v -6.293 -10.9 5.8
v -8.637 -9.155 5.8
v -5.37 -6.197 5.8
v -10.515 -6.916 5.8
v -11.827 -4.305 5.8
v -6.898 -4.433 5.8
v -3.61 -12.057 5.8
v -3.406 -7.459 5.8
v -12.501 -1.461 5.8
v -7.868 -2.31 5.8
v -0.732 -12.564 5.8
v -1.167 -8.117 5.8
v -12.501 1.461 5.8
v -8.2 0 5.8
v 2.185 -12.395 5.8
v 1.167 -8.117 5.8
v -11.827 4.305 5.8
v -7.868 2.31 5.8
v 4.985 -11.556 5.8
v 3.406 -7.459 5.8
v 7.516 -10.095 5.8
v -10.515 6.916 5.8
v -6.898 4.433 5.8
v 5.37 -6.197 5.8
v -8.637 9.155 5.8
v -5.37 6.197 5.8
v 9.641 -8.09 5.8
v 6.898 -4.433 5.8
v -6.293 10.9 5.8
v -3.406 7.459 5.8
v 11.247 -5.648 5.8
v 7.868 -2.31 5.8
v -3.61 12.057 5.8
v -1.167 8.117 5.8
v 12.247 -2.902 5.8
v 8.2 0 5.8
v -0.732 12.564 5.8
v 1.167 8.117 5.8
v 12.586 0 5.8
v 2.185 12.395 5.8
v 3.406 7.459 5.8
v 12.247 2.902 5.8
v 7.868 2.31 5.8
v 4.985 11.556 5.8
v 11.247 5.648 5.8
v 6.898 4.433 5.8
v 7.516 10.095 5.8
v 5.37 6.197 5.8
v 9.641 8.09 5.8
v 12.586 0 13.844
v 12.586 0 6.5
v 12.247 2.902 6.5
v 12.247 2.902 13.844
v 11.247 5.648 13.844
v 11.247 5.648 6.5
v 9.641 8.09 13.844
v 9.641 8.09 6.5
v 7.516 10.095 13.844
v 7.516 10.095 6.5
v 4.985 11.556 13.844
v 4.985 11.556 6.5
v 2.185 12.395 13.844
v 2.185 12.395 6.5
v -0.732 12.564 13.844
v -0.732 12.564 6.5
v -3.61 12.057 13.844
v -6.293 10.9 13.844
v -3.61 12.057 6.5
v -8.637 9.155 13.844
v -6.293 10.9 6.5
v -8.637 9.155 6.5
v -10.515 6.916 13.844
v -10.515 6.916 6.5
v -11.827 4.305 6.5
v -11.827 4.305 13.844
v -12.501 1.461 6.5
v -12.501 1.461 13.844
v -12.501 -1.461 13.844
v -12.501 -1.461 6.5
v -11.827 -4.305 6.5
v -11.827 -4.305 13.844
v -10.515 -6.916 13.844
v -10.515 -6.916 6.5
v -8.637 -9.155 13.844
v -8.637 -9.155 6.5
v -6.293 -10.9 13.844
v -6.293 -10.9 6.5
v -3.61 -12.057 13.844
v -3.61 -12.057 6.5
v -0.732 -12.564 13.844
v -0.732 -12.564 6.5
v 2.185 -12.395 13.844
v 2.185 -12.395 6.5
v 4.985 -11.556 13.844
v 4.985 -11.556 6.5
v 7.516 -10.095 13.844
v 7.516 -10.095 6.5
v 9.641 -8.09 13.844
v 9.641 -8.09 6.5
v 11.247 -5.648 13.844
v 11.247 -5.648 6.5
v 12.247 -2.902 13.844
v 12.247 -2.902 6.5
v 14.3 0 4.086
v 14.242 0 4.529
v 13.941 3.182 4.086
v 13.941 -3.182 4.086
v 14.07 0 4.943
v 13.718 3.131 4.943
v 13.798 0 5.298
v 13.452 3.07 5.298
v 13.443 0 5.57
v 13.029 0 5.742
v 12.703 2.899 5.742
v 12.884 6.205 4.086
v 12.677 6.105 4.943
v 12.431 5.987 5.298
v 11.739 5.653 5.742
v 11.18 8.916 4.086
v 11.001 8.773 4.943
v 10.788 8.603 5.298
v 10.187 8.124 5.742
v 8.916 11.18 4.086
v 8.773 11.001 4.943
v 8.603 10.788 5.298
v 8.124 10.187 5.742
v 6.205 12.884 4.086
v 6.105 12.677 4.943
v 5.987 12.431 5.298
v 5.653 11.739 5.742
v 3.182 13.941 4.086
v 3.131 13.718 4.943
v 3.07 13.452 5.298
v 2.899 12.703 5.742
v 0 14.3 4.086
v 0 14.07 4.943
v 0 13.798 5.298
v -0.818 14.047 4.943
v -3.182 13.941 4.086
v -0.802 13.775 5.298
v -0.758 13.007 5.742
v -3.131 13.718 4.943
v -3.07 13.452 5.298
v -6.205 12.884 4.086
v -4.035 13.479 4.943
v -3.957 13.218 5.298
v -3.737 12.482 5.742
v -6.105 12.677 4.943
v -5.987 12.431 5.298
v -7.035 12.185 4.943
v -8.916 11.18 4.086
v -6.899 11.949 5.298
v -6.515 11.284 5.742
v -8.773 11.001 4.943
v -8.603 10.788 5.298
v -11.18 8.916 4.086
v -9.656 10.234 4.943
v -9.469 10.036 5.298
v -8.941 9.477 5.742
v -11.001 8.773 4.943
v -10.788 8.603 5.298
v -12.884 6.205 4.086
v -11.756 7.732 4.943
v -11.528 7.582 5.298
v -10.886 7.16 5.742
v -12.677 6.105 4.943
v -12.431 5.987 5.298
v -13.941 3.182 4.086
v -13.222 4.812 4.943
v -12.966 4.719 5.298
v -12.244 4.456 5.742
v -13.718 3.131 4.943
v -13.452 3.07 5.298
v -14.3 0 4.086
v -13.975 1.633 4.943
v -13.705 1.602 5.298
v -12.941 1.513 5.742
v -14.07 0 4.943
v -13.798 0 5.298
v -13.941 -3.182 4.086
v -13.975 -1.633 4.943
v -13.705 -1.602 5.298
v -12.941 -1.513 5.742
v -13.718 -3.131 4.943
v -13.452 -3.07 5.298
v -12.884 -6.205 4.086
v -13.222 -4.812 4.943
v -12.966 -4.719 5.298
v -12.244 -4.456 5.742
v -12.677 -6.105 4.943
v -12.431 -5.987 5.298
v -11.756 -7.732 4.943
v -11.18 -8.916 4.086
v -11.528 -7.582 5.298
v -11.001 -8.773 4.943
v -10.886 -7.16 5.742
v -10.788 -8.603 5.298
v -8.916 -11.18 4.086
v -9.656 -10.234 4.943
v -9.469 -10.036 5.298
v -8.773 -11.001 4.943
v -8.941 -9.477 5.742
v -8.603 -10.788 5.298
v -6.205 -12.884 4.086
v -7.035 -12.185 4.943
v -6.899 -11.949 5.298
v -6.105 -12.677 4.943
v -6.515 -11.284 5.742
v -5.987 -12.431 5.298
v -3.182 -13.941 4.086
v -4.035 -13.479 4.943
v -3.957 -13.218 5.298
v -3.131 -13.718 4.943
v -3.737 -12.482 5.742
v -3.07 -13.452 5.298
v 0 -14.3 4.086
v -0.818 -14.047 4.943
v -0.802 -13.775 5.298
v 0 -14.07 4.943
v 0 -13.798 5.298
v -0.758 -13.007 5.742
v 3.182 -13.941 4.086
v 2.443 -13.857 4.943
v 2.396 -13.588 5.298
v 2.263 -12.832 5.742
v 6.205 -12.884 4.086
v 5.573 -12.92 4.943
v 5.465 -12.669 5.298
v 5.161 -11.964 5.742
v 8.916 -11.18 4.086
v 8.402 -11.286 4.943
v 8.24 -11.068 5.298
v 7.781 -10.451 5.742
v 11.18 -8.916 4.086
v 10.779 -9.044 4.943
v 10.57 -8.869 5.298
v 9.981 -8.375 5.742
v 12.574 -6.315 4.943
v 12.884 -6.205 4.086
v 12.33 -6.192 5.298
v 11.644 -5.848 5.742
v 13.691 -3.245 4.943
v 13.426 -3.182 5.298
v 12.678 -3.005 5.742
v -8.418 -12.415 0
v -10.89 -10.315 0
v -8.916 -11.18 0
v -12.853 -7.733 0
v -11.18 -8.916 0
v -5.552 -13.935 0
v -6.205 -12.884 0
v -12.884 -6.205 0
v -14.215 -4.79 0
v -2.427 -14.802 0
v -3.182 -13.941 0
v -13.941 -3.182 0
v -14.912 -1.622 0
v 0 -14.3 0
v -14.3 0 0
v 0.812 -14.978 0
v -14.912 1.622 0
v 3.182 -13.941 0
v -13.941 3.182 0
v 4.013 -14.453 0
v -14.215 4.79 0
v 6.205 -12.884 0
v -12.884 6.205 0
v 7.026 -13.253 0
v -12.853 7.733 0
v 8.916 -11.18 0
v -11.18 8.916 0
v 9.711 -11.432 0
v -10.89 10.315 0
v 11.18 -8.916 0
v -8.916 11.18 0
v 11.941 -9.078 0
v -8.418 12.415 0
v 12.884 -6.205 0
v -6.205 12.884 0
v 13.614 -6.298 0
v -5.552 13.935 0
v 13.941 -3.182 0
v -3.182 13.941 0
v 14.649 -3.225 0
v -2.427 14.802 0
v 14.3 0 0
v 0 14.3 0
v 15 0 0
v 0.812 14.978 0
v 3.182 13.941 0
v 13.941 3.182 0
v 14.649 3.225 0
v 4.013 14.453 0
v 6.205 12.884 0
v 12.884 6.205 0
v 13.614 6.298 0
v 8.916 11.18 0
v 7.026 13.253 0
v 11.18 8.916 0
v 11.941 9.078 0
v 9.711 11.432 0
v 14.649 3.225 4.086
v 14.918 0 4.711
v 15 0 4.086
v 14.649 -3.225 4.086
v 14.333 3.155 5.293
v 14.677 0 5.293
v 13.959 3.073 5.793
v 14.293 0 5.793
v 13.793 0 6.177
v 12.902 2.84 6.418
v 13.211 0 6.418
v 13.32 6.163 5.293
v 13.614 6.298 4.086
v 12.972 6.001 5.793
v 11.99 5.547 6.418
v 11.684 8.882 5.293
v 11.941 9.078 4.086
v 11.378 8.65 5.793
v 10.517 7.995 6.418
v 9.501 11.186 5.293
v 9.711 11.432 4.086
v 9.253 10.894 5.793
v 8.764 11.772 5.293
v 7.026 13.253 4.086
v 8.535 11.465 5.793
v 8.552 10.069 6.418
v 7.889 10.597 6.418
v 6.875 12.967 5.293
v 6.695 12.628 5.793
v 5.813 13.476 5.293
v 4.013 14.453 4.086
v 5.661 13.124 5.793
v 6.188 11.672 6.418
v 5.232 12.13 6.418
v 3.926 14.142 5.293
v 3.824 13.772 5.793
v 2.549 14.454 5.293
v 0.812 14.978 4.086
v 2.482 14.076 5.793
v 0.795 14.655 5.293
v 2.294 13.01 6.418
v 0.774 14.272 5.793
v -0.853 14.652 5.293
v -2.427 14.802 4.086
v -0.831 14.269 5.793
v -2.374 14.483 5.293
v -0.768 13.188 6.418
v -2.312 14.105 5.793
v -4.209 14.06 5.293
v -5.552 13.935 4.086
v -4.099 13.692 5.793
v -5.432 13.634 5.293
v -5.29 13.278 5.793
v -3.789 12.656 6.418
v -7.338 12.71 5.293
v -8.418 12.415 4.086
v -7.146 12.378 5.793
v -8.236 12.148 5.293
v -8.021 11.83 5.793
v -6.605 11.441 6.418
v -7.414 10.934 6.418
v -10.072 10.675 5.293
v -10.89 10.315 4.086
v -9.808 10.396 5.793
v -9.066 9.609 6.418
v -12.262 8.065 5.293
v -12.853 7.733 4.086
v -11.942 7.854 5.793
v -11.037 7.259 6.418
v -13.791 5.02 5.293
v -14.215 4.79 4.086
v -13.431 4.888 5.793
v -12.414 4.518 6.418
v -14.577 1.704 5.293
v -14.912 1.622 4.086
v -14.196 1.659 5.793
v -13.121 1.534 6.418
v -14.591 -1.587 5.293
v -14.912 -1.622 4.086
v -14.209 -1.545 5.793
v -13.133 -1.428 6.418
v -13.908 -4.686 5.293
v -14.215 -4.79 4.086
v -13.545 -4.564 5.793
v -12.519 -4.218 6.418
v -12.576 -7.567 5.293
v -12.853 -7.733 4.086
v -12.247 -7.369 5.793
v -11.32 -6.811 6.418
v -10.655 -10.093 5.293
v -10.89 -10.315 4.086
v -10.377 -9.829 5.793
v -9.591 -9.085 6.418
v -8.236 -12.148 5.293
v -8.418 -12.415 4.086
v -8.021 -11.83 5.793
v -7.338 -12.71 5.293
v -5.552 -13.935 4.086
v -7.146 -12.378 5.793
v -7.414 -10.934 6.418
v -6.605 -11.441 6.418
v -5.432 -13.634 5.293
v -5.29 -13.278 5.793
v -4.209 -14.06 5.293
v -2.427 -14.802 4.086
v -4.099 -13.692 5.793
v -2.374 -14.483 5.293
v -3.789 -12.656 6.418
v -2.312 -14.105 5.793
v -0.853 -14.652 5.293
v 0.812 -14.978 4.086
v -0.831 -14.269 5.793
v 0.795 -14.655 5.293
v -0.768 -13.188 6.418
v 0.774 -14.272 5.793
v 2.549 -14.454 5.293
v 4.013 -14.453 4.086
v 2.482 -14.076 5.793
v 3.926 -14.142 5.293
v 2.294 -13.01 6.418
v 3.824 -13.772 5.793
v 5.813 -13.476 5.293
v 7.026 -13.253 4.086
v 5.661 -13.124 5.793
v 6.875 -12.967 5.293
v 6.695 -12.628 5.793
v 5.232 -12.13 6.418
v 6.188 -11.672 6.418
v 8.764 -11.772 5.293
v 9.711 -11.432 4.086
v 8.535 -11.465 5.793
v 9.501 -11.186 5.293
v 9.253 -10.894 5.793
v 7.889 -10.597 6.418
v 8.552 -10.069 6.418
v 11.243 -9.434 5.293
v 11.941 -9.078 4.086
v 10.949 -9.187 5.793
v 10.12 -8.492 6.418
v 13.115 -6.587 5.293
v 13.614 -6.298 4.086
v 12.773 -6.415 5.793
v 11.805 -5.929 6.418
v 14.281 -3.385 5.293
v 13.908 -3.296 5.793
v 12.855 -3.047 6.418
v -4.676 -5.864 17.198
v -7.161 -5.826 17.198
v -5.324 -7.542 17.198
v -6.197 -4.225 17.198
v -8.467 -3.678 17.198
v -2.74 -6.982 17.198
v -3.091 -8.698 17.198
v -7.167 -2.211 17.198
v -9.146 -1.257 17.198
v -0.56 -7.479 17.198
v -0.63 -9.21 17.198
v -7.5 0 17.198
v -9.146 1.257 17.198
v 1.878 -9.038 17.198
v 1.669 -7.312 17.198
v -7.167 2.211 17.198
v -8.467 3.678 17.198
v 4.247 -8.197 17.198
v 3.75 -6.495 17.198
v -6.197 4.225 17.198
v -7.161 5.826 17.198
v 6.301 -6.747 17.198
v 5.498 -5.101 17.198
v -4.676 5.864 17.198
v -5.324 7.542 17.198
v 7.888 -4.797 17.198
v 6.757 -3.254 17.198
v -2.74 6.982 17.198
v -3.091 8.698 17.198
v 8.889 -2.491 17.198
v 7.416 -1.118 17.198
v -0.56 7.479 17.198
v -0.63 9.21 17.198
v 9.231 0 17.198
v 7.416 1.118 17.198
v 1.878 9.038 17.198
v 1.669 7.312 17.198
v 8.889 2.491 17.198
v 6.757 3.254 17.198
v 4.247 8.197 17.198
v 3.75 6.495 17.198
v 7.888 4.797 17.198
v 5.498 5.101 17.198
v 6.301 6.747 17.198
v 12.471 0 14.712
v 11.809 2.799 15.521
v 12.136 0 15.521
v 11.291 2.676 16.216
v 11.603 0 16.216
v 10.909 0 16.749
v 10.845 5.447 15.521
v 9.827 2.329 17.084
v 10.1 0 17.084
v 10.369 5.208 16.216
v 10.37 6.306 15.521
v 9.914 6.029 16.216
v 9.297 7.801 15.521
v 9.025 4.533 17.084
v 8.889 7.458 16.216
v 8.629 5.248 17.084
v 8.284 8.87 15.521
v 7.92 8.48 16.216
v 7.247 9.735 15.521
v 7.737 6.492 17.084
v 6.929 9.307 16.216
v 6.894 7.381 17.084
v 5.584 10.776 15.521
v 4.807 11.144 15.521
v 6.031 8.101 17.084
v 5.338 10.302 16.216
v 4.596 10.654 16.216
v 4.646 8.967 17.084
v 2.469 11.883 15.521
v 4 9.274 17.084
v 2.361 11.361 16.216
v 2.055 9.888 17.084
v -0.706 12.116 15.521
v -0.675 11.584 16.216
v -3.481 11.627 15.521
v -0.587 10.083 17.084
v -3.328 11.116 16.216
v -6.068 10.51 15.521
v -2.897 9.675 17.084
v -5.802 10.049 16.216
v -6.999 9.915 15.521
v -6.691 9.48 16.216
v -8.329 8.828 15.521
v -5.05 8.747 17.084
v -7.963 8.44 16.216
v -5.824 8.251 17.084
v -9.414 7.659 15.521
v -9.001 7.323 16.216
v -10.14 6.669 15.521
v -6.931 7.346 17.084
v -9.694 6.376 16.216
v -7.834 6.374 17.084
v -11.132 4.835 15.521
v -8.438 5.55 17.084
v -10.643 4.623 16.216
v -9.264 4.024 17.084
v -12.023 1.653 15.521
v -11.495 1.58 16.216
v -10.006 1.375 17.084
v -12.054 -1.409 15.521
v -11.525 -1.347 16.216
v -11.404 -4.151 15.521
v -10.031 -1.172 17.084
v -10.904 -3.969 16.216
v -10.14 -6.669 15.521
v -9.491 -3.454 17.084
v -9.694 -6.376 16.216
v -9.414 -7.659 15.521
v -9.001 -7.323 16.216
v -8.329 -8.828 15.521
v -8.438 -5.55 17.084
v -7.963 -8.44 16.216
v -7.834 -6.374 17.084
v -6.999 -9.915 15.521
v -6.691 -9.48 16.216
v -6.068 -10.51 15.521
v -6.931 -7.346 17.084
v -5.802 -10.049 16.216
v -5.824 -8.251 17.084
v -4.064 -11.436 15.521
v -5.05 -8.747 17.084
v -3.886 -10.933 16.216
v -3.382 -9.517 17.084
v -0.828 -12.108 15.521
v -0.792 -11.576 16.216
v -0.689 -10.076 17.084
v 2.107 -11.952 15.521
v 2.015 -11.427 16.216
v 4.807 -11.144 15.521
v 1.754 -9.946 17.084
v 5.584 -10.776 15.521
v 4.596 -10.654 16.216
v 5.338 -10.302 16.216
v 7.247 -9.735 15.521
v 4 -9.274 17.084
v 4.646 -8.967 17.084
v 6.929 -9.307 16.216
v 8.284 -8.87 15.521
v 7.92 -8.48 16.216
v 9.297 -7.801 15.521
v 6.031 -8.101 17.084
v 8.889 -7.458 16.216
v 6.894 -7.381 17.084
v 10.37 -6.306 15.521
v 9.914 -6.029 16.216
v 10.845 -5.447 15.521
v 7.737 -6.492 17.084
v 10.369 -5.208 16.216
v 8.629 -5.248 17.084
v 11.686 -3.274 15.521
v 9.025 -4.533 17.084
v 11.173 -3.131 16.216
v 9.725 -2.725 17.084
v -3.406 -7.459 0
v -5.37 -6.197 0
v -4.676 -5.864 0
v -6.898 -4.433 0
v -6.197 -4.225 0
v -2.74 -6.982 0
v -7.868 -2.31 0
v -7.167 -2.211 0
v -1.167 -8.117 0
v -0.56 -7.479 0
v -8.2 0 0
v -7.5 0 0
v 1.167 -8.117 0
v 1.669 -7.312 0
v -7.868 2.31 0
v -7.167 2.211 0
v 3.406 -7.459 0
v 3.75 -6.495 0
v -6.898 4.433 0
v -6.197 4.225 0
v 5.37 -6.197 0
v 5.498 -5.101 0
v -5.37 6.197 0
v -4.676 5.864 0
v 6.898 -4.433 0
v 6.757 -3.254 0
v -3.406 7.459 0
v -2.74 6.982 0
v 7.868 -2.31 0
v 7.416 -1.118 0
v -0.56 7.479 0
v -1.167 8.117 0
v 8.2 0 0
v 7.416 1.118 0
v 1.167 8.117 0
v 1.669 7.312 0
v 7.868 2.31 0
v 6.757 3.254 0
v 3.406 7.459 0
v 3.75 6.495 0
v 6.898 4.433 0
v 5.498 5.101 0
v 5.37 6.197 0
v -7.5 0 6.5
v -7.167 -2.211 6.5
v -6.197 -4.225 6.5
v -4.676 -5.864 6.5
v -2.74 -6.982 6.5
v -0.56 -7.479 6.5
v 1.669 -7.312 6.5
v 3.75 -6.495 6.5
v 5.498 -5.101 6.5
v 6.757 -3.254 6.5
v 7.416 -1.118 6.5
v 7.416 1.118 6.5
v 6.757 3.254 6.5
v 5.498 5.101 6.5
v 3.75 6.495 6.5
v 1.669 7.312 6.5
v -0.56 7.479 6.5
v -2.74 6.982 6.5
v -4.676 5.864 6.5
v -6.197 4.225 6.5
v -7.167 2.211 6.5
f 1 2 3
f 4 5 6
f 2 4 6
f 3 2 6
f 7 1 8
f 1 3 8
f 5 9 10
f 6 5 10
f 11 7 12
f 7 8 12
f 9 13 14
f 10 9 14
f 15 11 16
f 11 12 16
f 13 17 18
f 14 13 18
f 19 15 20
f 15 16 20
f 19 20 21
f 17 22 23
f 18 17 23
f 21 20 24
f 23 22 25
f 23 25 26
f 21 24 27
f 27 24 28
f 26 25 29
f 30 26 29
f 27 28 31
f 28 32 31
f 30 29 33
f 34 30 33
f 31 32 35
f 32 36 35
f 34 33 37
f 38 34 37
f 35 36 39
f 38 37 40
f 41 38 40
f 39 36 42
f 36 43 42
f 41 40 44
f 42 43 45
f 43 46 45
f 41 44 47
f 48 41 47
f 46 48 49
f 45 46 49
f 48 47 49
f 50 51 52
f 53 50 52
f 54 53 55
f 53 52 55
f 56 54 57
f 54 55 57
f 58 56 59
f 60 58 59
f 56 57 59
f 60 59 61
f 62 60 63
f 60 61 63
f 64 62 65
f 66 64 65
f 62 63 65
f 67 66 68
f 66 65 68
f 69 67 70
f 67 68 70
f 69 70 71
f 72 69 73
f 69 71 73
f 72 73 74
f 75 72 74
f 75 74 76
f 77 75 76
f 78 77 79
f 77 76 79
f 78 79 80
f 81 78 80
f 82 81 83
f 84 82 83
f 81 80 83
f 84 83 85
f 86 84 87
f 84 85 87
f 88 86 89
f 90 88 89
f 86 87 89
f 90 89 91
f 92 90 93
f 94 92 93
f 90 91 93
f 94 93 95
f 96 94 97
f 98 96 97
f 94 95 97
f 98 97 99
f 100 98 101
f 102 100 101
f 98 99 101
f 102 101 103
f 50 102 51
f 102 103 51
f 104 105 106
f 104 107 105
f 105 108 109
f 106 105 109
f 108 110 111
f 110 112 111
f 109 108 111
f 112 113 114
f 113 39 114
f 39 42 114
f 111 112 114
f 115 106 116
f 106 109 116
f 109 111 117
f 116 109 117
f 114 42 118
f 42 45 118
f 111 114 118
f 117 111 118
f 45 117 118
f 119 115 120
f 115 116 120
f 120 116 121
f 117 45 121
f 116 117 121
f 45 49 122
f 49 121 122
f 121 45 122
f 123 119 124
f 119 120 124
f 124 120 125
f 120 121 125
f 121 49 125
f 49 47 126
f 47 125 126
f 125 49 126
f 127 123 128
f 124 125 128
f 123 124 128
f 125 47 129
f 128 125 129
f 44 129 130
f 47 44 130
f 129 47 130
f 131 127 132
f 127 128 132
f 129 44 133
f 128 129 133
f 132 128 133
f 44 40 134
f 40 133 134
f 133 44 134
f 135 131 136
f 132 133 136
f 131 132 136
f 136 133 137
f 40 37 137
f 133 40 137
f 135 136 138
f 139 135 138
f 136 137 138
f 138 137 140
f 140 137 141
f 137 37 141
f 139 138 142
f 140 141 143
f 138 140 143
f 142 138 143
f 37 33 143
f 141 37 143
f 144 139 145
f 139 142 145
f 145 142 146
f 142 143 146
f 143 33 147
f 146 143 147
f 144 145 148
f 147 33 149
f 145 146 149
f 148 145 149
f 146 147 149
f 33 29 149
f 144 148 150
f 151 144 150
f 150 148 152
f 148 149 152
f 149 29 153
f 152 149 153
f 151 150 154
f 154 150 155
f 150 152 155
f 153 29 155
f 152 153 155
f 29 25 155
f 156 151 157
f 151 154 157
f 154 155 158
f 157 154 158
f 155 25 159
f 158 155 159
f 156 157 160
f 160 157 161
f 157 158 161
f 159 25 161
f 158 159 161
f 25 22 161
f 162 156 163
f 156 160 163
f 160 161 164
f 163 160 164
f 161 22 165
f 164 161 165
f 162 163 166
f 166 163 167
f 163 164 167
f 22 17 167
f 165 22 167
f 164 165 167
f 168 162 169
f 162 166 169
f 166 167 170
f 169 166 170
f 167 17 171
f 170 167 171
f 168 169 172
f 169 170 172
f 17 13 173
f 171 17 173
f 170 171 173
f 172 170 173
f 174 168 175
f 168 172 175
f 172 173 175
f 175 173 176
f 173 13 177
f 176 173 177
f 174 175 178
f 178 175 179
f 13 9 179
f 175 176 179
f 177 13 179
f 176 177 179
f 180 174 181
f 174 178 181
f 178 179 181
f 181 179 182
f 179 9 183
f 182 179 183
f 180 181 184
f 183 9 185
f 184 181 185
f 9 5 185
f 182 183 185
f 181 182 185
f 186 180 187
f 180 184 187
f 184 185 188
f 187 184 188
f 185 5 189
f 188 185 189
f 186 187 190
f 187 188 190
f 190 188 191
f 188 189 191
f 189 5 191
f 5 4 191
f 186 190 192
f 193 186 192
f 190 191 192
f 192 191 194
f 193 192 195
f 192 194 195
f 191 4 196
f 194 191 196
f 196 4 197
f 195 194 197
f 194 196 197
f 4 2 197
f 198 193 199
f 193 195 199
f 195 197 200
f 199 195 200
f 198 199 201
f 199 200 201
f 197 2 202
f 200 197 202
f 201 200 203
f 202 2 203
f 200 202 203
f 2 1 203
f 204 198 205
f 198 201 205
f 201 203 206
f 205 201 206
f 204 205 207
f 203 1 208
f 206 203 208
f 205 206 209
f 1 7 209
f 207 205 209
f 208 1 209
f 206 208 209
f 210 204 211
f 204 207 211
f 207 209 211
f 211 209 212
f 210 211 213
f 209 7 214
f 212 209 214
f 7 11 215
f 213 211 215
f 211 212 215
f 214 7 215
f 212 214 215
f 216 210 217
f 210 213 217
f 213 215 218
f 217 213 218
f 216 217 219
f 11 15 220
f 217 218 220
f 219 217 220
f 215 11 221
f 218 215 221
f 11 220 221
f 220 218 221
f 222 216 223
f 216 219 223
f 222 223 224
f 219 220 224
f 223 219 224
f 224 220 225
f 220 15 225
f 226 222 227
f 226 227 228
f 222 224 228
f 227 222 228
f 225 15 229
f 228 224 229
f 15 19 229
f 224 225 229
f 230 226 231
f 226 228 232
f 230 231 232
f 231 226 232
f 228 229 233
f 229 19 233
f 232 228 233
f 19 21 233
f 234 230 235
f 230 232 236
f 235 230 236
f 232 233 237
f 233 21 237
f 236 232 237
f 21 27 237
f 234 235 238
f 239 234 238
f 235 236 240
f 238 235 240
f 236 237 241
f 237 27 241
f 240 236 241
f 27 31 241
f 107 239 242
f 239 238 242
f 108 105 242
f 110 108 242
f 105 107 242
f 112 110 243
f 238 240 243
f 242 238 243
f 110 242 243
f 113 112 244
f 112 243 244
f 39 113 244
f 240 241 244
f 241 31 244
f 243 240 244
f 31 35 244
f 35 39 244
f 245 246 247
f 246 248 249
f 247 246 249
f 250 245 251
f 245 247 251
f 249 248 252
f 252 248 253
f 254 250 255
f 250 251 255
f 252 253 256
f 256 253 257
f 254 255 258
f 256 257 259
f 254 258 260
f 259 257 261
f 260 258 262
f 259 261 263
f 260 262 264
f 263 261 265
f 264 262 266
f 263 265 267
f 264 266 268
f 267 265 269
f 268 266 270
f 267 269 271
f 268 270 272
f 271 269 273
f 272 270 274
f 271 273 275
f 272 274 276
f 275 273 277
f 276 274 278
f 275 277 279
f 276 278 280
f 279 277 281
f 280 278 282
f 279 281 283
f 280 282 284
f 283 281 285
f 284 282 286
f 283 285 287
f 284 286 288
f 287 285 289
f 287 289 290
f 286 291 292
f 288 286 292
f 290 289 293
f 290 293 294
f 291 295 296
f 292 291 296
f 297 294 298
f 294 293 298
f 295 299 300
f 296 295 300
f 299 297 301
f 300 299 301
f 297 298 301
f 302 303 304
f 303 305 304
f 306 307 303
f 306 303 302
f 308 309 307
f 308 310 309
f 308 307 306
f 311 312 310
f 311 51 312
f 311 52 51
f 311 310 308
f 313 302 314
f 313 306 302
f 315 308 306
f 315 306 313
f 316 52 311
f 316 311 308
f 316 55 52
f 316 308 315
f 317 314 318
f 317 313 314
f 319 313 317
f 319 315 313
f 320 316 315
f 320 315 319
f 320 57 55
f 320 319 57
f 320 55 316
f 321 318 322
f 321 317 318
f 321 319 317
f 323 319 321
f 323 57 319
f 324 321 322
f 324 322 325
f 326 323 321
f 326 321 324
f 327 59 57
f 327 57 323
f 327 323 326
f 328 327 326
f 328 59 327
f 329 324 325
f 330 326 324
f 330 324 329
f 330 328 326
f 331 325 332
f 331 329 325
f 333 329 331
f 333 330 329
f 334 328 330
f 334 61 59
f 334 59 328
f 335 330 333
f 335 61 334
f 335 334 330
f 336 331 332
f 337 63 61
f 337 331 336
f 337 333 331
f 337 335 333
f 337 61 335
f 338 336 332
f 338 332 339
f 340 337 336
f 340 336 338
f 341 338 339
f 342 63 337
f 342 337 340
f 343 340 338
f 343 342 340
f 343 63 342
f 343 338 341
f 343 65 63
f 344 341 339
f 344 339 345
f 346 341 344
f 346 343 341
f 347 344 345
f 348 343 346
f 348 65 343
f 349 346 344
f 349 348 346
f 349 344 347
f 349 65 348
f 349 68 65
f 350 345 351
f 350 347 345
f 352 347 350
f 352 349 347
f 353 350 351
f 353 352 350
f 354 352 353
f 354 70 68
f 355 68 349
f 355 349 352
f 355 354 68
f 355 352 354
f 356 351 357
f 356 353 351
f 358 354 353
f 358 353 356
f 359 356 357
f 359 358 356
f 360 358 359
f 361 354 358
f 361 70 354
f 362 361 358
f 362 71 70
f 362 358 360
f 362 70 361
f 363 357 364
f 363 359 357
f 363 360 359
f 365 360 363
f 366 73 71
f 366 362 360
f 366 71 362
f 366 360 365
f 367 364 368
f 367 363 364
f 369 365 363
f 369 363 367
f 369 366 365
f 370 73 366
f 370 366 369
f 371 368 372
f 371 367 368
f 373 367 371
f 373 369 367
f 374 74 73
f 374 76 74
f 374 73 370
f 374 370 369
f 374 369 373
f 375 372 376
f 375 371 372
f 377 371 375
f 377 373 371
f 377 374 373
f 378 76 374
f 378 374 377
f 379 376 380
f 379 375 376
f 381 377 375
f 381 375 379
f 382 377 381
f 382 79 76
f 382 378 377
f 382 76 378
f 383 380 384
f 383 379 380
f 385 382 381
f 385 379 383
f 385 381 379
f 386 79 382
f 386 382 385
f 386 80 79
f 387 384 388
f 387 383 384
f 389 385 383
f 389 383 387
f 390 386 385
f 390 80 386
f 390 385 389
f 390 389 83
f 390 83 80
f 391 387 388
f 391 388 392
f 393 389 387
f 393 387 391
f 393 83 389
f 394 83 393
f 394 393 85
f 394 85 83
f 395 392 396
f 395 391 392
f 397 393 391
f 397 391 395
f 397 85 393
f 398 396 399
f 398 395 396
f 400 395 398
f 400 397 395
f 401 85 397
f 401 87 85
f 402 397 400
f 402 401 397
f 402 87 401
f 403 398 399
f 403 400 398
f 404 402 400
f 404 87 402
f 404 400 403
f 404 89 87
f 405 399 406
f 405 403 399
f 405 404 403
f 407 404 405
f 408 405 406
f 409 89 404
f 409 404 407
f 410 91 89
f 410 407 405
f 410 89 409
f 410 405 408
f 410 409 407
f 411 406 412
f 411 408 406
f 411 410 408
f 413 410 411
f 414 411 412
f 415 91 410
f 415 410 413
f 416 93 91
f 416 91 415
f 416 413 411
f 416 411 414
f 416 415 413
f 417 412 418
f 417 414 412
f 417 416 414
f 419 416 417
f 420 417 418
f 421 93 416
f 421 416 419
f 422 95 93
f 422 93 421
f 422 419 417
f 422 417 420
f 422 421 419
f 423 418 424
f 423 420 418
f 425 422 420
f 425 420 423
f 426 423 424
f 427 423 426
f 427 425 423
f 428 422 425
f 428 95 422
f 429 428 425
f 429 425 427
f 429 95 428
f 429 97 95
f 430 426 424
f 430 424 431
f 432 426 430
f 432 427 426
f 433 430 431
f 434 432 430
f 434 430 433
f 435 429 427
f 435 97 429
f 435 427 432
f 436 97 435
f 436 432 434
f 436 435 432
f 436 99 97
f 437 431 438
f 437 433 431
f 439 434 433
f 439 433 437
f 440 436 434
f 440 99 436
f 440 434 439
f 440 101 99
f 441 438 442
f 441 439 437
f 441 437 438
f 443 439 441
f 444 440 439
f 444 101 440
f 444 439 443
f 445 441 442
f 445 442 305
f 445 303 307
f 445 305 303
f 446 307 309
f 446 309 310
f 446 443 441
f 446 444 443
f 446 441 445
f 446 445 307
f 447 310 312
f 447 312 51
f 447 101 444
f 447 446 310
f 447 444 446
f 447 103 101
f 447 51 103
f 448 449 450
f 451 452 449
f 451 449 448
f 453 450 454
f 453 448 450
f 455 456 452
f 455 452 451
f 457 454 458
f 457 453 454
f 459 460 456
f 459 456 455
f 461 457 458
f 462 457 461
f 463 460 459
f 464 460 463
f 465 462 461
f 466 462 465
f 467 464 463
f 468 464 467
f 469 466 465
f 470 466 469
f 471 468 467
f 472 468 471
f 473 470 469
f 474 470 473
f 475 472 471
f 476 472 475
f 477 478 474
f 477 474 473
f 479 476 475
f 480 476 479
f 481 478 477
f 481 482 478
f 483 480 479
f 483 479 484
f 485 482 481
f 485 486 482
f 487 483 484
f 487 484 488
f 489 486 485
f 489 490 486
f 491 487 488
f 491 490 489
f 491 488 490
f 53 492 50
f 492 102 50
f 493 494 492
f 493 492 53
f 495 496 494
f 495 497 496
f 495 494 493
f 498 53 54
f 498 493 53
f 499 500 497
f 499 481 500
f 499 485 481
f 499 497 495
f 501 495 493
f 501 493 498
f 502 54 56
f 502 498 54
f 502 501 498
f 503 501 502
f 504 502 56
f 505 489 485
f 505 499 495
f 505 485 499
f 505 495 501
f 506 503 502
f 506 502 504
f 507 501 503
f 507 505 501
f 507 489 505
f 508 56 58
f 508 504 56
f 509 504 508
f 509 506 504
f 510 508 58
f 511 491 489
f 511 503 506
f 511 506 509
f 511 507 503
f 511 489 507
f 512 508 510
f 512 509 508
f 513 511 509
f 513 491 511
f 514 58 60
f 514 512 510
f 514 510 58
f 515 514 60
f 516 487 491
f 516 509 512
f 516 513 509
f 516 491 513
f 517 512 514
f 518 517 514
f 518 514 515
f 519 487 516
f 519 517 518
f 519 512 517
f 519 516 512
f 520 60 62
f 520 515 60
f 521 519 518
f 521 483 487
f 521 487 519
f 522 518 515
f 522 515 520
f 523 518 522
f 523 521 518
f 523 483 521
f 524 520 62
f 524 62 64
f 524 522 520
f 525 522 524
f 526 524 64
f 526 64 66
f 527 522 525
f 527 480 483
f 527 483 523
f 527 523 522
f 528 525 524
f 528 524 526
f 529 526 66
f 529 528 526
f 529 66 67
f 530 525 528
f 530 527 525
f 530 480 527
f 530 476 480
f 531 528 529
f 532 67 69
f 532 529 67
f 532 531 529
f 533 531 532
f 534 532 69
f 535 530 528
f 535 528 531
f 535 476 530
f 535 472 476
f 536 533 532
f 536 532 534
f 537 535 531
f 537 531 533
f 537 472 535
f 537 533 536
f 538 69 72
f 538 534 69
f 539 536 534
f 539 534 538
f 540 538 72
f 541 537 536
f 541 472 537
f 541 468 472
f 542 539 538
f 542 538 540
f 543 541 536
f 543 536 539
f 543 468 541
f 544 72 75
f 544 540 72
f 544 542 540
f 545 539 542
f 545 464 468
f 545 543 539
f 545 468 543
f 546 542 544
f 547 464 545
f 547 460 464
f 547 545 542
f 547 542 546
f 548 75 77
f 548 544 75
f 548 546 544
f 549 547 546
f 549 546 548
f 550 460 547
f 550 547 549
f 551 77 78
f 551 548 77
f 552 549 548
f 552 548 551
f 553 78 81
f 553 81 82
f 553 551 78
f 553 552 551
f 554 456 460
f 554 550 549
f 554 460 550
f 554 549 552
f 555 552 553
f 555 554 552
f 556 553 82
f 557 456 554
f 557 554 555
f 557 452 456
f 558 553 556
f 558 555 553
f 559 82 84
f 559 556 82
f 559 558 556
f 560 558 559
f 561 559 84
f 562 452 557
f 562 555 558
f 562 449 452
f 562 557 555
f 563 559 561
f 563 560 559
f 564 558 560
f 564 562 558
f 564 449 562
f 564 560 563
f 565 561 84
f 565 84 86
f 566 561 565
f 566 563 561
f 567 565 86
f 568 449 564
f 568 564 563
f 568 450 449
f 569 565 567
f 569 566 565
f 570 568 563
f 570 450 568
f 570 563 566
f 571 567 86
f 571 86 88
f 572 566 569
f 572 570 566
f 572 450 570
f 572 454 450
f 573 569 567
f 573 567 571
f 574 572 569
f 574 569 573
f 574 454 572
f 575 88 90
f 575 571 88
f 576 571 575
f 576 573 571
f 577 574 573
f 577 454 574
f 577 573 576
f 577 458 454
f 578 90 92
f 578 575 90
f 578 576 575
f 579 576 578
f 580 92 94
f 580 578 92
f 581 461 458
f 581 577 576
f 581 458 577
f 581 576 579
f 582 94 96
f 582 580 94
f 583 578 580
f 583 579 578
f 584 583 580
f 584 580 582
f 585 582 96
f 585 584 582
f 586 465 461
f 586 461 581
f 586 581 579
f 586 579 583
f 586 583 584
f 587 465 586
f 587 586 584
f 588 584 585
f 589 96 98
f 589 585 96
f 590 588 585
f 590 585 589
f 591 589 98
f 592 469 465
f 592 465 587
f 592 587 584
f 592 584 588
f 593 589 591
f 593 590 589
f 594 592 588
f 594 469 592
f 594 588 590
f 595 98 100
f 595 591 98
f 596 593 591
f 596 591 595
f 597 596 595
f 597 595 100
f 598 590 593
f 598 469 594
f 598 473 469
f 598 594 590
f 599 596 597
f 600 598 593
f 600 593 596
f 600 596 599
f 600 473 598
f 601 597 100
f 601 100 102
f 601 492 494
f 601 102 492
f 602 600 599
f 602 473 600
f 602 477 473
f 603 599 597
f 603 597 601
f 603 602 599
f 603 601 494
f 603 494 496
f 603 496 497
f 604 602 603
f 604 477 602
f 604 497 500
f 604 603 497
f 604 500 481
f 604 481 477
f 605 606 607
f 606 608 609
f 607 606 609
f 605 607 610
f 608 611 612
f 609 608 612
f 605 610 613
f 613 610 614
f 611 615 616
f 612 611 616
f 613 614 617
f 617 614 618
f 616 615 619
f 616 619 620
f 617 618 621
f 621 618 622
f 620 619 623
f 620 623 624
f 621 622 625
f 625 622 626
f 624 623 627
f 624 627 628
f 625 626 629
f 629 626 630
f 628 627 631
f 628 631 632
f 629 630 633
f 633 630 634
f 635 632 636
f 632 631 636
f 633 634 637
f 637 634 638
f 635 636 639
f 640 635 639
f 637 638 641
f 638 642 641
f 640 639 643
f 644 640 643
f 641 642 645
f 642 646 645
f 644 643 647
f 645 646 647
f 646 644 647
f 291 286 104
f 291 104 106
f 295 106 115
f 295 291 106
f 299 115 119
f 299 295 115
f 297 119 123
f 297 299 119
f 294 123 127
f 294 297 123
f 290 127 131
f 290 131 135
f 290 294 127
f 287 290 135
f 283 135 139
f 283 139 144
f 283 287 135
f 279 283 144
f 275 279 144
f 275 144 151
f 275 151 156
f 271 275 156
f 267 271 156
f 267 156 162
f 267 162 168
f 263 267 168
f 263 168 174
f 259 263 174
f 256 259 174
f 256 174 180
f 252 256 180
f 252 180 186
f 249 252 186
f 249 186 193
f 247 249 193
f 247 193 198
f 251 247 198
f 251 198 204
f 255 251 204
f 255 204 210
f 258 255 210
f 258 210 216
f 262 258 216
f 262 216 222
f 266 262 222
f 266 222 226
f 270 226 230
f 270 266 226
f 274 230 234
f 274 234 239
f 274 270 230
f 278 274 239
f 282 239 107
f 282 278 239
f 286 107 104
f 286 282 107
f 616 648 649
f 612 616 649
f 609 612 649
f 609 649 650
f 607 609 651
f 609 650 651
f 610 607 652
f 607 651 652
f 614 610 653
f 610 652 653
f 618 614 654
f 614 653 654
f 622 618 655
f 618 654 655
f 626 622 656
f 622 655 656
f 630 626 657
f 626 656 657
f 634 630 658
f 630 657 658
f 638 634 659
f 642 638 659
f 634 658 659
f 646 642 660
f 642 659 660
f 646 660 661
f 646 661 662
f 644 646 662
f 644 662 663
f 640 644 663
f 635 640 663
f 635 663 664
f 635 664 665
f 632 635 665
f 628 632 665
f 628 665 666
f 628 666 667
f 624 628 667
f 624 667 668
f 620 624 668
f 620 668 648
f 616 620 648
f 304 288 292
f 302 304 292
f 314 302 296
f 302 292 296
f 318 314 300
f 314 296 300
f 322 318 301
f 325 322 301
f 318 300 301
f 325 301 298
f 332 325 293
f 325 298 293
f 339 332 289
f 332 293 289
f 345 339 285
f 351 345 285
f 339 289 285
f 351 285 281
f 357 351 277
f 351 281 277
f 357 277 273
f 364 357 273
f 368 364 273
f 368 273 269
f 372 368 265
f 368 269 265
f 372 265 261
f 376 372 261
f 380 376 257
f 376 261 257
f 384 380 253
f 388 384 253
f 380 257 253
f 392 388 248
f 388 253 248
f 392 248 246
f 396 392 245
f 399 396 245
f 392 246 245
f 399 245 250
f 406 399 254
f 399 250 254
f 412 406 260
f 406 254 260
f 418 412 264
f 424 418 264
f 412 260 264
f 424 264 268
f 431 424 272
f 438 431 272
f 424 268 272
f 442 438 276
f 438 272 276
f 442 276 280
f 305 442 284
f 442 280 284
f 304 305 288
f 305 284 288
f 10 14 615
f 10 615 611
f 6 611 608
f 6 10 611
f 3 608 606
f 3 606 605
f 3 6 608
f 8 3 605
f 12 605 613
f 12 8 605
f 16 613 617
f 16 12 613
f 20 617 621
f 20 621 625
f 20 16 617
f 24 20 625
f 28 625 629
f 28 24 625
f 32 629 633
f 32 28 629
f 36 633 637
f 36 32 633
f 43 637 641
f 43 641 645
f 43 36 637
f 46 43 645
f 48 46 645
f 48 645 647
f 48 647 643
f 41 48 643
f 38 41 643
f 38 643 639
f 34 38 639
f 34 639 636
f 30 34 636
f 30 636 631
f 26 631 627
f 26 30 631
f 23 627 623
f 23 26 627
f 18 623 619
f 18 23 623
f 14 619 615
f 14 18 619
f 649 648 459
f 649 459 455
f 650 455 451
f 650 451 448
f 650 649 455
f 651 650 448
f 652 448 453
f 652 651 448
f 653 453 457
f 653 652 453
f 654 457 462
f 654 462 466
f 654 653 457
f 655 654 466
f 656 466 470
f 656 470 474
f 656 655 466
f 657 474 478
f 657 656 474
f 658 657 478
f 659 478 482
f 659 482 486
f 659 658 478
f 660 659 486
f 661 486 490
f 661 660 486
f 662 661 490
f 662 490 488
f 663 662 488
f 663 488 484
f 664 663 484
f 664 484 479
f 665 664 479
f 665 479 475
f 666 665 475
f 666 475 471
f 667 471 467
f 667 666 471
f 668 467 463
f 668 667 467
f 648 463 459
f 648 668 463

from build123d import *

# Parameters (mm, degrees)
F0_R     = 15
F1_DEPTH = 6.5
F2_R     = 2.4142135624
F4_D     = 15
F5_T     = -0.7
F7_DEPTH = 10.6984395534
F8_R     = 3.3542973282


with BuildPart() as f1:
    # F0 (on Top) → F1 (new body)
    with BuildSketch(Plane.XY):
        Circle(F0_R)
    extrude(amount=F1_DEPTH)

    # F2
    f2_edges = [f1.edges().sort_by_distance(p)[0] for p in [
        (-15, 0, 6.5),
    ]]
    fillet(f2_edges, radius=F2_R)

    # F4 (through all)
    with Locations(Plane(origin=(0, 0, 0), x_dir=(1, 0, 0), z_dir=(0, 0, -1))):
        with Locations((0, 0)):
            Hole(F4_D / 2)

    # F5
    f5_openings = [f1.faces().sort_by_distance(p)[0] for p in [
        (-14.575736, 0, 0),
    ]]
    offset(amount=F5_T, openings=f5_openings)

    # F7 (add): a face of the model
    f7_faces = [f1.faces().sort_by_distance(p)[0] for p in [
        (-12.2298066402, 0, 6.5),
    ]]
    extrude(f7_faces, amount=F7_DEPTH)

    # F8
    f8_edges = [f1.edges().sort_by_distance(p)[0] for p in [
        (-12.585786, 0, 17.19844),
    ]]
    fillet(f8_edges, radius=F8_R)


solid = f1.part
